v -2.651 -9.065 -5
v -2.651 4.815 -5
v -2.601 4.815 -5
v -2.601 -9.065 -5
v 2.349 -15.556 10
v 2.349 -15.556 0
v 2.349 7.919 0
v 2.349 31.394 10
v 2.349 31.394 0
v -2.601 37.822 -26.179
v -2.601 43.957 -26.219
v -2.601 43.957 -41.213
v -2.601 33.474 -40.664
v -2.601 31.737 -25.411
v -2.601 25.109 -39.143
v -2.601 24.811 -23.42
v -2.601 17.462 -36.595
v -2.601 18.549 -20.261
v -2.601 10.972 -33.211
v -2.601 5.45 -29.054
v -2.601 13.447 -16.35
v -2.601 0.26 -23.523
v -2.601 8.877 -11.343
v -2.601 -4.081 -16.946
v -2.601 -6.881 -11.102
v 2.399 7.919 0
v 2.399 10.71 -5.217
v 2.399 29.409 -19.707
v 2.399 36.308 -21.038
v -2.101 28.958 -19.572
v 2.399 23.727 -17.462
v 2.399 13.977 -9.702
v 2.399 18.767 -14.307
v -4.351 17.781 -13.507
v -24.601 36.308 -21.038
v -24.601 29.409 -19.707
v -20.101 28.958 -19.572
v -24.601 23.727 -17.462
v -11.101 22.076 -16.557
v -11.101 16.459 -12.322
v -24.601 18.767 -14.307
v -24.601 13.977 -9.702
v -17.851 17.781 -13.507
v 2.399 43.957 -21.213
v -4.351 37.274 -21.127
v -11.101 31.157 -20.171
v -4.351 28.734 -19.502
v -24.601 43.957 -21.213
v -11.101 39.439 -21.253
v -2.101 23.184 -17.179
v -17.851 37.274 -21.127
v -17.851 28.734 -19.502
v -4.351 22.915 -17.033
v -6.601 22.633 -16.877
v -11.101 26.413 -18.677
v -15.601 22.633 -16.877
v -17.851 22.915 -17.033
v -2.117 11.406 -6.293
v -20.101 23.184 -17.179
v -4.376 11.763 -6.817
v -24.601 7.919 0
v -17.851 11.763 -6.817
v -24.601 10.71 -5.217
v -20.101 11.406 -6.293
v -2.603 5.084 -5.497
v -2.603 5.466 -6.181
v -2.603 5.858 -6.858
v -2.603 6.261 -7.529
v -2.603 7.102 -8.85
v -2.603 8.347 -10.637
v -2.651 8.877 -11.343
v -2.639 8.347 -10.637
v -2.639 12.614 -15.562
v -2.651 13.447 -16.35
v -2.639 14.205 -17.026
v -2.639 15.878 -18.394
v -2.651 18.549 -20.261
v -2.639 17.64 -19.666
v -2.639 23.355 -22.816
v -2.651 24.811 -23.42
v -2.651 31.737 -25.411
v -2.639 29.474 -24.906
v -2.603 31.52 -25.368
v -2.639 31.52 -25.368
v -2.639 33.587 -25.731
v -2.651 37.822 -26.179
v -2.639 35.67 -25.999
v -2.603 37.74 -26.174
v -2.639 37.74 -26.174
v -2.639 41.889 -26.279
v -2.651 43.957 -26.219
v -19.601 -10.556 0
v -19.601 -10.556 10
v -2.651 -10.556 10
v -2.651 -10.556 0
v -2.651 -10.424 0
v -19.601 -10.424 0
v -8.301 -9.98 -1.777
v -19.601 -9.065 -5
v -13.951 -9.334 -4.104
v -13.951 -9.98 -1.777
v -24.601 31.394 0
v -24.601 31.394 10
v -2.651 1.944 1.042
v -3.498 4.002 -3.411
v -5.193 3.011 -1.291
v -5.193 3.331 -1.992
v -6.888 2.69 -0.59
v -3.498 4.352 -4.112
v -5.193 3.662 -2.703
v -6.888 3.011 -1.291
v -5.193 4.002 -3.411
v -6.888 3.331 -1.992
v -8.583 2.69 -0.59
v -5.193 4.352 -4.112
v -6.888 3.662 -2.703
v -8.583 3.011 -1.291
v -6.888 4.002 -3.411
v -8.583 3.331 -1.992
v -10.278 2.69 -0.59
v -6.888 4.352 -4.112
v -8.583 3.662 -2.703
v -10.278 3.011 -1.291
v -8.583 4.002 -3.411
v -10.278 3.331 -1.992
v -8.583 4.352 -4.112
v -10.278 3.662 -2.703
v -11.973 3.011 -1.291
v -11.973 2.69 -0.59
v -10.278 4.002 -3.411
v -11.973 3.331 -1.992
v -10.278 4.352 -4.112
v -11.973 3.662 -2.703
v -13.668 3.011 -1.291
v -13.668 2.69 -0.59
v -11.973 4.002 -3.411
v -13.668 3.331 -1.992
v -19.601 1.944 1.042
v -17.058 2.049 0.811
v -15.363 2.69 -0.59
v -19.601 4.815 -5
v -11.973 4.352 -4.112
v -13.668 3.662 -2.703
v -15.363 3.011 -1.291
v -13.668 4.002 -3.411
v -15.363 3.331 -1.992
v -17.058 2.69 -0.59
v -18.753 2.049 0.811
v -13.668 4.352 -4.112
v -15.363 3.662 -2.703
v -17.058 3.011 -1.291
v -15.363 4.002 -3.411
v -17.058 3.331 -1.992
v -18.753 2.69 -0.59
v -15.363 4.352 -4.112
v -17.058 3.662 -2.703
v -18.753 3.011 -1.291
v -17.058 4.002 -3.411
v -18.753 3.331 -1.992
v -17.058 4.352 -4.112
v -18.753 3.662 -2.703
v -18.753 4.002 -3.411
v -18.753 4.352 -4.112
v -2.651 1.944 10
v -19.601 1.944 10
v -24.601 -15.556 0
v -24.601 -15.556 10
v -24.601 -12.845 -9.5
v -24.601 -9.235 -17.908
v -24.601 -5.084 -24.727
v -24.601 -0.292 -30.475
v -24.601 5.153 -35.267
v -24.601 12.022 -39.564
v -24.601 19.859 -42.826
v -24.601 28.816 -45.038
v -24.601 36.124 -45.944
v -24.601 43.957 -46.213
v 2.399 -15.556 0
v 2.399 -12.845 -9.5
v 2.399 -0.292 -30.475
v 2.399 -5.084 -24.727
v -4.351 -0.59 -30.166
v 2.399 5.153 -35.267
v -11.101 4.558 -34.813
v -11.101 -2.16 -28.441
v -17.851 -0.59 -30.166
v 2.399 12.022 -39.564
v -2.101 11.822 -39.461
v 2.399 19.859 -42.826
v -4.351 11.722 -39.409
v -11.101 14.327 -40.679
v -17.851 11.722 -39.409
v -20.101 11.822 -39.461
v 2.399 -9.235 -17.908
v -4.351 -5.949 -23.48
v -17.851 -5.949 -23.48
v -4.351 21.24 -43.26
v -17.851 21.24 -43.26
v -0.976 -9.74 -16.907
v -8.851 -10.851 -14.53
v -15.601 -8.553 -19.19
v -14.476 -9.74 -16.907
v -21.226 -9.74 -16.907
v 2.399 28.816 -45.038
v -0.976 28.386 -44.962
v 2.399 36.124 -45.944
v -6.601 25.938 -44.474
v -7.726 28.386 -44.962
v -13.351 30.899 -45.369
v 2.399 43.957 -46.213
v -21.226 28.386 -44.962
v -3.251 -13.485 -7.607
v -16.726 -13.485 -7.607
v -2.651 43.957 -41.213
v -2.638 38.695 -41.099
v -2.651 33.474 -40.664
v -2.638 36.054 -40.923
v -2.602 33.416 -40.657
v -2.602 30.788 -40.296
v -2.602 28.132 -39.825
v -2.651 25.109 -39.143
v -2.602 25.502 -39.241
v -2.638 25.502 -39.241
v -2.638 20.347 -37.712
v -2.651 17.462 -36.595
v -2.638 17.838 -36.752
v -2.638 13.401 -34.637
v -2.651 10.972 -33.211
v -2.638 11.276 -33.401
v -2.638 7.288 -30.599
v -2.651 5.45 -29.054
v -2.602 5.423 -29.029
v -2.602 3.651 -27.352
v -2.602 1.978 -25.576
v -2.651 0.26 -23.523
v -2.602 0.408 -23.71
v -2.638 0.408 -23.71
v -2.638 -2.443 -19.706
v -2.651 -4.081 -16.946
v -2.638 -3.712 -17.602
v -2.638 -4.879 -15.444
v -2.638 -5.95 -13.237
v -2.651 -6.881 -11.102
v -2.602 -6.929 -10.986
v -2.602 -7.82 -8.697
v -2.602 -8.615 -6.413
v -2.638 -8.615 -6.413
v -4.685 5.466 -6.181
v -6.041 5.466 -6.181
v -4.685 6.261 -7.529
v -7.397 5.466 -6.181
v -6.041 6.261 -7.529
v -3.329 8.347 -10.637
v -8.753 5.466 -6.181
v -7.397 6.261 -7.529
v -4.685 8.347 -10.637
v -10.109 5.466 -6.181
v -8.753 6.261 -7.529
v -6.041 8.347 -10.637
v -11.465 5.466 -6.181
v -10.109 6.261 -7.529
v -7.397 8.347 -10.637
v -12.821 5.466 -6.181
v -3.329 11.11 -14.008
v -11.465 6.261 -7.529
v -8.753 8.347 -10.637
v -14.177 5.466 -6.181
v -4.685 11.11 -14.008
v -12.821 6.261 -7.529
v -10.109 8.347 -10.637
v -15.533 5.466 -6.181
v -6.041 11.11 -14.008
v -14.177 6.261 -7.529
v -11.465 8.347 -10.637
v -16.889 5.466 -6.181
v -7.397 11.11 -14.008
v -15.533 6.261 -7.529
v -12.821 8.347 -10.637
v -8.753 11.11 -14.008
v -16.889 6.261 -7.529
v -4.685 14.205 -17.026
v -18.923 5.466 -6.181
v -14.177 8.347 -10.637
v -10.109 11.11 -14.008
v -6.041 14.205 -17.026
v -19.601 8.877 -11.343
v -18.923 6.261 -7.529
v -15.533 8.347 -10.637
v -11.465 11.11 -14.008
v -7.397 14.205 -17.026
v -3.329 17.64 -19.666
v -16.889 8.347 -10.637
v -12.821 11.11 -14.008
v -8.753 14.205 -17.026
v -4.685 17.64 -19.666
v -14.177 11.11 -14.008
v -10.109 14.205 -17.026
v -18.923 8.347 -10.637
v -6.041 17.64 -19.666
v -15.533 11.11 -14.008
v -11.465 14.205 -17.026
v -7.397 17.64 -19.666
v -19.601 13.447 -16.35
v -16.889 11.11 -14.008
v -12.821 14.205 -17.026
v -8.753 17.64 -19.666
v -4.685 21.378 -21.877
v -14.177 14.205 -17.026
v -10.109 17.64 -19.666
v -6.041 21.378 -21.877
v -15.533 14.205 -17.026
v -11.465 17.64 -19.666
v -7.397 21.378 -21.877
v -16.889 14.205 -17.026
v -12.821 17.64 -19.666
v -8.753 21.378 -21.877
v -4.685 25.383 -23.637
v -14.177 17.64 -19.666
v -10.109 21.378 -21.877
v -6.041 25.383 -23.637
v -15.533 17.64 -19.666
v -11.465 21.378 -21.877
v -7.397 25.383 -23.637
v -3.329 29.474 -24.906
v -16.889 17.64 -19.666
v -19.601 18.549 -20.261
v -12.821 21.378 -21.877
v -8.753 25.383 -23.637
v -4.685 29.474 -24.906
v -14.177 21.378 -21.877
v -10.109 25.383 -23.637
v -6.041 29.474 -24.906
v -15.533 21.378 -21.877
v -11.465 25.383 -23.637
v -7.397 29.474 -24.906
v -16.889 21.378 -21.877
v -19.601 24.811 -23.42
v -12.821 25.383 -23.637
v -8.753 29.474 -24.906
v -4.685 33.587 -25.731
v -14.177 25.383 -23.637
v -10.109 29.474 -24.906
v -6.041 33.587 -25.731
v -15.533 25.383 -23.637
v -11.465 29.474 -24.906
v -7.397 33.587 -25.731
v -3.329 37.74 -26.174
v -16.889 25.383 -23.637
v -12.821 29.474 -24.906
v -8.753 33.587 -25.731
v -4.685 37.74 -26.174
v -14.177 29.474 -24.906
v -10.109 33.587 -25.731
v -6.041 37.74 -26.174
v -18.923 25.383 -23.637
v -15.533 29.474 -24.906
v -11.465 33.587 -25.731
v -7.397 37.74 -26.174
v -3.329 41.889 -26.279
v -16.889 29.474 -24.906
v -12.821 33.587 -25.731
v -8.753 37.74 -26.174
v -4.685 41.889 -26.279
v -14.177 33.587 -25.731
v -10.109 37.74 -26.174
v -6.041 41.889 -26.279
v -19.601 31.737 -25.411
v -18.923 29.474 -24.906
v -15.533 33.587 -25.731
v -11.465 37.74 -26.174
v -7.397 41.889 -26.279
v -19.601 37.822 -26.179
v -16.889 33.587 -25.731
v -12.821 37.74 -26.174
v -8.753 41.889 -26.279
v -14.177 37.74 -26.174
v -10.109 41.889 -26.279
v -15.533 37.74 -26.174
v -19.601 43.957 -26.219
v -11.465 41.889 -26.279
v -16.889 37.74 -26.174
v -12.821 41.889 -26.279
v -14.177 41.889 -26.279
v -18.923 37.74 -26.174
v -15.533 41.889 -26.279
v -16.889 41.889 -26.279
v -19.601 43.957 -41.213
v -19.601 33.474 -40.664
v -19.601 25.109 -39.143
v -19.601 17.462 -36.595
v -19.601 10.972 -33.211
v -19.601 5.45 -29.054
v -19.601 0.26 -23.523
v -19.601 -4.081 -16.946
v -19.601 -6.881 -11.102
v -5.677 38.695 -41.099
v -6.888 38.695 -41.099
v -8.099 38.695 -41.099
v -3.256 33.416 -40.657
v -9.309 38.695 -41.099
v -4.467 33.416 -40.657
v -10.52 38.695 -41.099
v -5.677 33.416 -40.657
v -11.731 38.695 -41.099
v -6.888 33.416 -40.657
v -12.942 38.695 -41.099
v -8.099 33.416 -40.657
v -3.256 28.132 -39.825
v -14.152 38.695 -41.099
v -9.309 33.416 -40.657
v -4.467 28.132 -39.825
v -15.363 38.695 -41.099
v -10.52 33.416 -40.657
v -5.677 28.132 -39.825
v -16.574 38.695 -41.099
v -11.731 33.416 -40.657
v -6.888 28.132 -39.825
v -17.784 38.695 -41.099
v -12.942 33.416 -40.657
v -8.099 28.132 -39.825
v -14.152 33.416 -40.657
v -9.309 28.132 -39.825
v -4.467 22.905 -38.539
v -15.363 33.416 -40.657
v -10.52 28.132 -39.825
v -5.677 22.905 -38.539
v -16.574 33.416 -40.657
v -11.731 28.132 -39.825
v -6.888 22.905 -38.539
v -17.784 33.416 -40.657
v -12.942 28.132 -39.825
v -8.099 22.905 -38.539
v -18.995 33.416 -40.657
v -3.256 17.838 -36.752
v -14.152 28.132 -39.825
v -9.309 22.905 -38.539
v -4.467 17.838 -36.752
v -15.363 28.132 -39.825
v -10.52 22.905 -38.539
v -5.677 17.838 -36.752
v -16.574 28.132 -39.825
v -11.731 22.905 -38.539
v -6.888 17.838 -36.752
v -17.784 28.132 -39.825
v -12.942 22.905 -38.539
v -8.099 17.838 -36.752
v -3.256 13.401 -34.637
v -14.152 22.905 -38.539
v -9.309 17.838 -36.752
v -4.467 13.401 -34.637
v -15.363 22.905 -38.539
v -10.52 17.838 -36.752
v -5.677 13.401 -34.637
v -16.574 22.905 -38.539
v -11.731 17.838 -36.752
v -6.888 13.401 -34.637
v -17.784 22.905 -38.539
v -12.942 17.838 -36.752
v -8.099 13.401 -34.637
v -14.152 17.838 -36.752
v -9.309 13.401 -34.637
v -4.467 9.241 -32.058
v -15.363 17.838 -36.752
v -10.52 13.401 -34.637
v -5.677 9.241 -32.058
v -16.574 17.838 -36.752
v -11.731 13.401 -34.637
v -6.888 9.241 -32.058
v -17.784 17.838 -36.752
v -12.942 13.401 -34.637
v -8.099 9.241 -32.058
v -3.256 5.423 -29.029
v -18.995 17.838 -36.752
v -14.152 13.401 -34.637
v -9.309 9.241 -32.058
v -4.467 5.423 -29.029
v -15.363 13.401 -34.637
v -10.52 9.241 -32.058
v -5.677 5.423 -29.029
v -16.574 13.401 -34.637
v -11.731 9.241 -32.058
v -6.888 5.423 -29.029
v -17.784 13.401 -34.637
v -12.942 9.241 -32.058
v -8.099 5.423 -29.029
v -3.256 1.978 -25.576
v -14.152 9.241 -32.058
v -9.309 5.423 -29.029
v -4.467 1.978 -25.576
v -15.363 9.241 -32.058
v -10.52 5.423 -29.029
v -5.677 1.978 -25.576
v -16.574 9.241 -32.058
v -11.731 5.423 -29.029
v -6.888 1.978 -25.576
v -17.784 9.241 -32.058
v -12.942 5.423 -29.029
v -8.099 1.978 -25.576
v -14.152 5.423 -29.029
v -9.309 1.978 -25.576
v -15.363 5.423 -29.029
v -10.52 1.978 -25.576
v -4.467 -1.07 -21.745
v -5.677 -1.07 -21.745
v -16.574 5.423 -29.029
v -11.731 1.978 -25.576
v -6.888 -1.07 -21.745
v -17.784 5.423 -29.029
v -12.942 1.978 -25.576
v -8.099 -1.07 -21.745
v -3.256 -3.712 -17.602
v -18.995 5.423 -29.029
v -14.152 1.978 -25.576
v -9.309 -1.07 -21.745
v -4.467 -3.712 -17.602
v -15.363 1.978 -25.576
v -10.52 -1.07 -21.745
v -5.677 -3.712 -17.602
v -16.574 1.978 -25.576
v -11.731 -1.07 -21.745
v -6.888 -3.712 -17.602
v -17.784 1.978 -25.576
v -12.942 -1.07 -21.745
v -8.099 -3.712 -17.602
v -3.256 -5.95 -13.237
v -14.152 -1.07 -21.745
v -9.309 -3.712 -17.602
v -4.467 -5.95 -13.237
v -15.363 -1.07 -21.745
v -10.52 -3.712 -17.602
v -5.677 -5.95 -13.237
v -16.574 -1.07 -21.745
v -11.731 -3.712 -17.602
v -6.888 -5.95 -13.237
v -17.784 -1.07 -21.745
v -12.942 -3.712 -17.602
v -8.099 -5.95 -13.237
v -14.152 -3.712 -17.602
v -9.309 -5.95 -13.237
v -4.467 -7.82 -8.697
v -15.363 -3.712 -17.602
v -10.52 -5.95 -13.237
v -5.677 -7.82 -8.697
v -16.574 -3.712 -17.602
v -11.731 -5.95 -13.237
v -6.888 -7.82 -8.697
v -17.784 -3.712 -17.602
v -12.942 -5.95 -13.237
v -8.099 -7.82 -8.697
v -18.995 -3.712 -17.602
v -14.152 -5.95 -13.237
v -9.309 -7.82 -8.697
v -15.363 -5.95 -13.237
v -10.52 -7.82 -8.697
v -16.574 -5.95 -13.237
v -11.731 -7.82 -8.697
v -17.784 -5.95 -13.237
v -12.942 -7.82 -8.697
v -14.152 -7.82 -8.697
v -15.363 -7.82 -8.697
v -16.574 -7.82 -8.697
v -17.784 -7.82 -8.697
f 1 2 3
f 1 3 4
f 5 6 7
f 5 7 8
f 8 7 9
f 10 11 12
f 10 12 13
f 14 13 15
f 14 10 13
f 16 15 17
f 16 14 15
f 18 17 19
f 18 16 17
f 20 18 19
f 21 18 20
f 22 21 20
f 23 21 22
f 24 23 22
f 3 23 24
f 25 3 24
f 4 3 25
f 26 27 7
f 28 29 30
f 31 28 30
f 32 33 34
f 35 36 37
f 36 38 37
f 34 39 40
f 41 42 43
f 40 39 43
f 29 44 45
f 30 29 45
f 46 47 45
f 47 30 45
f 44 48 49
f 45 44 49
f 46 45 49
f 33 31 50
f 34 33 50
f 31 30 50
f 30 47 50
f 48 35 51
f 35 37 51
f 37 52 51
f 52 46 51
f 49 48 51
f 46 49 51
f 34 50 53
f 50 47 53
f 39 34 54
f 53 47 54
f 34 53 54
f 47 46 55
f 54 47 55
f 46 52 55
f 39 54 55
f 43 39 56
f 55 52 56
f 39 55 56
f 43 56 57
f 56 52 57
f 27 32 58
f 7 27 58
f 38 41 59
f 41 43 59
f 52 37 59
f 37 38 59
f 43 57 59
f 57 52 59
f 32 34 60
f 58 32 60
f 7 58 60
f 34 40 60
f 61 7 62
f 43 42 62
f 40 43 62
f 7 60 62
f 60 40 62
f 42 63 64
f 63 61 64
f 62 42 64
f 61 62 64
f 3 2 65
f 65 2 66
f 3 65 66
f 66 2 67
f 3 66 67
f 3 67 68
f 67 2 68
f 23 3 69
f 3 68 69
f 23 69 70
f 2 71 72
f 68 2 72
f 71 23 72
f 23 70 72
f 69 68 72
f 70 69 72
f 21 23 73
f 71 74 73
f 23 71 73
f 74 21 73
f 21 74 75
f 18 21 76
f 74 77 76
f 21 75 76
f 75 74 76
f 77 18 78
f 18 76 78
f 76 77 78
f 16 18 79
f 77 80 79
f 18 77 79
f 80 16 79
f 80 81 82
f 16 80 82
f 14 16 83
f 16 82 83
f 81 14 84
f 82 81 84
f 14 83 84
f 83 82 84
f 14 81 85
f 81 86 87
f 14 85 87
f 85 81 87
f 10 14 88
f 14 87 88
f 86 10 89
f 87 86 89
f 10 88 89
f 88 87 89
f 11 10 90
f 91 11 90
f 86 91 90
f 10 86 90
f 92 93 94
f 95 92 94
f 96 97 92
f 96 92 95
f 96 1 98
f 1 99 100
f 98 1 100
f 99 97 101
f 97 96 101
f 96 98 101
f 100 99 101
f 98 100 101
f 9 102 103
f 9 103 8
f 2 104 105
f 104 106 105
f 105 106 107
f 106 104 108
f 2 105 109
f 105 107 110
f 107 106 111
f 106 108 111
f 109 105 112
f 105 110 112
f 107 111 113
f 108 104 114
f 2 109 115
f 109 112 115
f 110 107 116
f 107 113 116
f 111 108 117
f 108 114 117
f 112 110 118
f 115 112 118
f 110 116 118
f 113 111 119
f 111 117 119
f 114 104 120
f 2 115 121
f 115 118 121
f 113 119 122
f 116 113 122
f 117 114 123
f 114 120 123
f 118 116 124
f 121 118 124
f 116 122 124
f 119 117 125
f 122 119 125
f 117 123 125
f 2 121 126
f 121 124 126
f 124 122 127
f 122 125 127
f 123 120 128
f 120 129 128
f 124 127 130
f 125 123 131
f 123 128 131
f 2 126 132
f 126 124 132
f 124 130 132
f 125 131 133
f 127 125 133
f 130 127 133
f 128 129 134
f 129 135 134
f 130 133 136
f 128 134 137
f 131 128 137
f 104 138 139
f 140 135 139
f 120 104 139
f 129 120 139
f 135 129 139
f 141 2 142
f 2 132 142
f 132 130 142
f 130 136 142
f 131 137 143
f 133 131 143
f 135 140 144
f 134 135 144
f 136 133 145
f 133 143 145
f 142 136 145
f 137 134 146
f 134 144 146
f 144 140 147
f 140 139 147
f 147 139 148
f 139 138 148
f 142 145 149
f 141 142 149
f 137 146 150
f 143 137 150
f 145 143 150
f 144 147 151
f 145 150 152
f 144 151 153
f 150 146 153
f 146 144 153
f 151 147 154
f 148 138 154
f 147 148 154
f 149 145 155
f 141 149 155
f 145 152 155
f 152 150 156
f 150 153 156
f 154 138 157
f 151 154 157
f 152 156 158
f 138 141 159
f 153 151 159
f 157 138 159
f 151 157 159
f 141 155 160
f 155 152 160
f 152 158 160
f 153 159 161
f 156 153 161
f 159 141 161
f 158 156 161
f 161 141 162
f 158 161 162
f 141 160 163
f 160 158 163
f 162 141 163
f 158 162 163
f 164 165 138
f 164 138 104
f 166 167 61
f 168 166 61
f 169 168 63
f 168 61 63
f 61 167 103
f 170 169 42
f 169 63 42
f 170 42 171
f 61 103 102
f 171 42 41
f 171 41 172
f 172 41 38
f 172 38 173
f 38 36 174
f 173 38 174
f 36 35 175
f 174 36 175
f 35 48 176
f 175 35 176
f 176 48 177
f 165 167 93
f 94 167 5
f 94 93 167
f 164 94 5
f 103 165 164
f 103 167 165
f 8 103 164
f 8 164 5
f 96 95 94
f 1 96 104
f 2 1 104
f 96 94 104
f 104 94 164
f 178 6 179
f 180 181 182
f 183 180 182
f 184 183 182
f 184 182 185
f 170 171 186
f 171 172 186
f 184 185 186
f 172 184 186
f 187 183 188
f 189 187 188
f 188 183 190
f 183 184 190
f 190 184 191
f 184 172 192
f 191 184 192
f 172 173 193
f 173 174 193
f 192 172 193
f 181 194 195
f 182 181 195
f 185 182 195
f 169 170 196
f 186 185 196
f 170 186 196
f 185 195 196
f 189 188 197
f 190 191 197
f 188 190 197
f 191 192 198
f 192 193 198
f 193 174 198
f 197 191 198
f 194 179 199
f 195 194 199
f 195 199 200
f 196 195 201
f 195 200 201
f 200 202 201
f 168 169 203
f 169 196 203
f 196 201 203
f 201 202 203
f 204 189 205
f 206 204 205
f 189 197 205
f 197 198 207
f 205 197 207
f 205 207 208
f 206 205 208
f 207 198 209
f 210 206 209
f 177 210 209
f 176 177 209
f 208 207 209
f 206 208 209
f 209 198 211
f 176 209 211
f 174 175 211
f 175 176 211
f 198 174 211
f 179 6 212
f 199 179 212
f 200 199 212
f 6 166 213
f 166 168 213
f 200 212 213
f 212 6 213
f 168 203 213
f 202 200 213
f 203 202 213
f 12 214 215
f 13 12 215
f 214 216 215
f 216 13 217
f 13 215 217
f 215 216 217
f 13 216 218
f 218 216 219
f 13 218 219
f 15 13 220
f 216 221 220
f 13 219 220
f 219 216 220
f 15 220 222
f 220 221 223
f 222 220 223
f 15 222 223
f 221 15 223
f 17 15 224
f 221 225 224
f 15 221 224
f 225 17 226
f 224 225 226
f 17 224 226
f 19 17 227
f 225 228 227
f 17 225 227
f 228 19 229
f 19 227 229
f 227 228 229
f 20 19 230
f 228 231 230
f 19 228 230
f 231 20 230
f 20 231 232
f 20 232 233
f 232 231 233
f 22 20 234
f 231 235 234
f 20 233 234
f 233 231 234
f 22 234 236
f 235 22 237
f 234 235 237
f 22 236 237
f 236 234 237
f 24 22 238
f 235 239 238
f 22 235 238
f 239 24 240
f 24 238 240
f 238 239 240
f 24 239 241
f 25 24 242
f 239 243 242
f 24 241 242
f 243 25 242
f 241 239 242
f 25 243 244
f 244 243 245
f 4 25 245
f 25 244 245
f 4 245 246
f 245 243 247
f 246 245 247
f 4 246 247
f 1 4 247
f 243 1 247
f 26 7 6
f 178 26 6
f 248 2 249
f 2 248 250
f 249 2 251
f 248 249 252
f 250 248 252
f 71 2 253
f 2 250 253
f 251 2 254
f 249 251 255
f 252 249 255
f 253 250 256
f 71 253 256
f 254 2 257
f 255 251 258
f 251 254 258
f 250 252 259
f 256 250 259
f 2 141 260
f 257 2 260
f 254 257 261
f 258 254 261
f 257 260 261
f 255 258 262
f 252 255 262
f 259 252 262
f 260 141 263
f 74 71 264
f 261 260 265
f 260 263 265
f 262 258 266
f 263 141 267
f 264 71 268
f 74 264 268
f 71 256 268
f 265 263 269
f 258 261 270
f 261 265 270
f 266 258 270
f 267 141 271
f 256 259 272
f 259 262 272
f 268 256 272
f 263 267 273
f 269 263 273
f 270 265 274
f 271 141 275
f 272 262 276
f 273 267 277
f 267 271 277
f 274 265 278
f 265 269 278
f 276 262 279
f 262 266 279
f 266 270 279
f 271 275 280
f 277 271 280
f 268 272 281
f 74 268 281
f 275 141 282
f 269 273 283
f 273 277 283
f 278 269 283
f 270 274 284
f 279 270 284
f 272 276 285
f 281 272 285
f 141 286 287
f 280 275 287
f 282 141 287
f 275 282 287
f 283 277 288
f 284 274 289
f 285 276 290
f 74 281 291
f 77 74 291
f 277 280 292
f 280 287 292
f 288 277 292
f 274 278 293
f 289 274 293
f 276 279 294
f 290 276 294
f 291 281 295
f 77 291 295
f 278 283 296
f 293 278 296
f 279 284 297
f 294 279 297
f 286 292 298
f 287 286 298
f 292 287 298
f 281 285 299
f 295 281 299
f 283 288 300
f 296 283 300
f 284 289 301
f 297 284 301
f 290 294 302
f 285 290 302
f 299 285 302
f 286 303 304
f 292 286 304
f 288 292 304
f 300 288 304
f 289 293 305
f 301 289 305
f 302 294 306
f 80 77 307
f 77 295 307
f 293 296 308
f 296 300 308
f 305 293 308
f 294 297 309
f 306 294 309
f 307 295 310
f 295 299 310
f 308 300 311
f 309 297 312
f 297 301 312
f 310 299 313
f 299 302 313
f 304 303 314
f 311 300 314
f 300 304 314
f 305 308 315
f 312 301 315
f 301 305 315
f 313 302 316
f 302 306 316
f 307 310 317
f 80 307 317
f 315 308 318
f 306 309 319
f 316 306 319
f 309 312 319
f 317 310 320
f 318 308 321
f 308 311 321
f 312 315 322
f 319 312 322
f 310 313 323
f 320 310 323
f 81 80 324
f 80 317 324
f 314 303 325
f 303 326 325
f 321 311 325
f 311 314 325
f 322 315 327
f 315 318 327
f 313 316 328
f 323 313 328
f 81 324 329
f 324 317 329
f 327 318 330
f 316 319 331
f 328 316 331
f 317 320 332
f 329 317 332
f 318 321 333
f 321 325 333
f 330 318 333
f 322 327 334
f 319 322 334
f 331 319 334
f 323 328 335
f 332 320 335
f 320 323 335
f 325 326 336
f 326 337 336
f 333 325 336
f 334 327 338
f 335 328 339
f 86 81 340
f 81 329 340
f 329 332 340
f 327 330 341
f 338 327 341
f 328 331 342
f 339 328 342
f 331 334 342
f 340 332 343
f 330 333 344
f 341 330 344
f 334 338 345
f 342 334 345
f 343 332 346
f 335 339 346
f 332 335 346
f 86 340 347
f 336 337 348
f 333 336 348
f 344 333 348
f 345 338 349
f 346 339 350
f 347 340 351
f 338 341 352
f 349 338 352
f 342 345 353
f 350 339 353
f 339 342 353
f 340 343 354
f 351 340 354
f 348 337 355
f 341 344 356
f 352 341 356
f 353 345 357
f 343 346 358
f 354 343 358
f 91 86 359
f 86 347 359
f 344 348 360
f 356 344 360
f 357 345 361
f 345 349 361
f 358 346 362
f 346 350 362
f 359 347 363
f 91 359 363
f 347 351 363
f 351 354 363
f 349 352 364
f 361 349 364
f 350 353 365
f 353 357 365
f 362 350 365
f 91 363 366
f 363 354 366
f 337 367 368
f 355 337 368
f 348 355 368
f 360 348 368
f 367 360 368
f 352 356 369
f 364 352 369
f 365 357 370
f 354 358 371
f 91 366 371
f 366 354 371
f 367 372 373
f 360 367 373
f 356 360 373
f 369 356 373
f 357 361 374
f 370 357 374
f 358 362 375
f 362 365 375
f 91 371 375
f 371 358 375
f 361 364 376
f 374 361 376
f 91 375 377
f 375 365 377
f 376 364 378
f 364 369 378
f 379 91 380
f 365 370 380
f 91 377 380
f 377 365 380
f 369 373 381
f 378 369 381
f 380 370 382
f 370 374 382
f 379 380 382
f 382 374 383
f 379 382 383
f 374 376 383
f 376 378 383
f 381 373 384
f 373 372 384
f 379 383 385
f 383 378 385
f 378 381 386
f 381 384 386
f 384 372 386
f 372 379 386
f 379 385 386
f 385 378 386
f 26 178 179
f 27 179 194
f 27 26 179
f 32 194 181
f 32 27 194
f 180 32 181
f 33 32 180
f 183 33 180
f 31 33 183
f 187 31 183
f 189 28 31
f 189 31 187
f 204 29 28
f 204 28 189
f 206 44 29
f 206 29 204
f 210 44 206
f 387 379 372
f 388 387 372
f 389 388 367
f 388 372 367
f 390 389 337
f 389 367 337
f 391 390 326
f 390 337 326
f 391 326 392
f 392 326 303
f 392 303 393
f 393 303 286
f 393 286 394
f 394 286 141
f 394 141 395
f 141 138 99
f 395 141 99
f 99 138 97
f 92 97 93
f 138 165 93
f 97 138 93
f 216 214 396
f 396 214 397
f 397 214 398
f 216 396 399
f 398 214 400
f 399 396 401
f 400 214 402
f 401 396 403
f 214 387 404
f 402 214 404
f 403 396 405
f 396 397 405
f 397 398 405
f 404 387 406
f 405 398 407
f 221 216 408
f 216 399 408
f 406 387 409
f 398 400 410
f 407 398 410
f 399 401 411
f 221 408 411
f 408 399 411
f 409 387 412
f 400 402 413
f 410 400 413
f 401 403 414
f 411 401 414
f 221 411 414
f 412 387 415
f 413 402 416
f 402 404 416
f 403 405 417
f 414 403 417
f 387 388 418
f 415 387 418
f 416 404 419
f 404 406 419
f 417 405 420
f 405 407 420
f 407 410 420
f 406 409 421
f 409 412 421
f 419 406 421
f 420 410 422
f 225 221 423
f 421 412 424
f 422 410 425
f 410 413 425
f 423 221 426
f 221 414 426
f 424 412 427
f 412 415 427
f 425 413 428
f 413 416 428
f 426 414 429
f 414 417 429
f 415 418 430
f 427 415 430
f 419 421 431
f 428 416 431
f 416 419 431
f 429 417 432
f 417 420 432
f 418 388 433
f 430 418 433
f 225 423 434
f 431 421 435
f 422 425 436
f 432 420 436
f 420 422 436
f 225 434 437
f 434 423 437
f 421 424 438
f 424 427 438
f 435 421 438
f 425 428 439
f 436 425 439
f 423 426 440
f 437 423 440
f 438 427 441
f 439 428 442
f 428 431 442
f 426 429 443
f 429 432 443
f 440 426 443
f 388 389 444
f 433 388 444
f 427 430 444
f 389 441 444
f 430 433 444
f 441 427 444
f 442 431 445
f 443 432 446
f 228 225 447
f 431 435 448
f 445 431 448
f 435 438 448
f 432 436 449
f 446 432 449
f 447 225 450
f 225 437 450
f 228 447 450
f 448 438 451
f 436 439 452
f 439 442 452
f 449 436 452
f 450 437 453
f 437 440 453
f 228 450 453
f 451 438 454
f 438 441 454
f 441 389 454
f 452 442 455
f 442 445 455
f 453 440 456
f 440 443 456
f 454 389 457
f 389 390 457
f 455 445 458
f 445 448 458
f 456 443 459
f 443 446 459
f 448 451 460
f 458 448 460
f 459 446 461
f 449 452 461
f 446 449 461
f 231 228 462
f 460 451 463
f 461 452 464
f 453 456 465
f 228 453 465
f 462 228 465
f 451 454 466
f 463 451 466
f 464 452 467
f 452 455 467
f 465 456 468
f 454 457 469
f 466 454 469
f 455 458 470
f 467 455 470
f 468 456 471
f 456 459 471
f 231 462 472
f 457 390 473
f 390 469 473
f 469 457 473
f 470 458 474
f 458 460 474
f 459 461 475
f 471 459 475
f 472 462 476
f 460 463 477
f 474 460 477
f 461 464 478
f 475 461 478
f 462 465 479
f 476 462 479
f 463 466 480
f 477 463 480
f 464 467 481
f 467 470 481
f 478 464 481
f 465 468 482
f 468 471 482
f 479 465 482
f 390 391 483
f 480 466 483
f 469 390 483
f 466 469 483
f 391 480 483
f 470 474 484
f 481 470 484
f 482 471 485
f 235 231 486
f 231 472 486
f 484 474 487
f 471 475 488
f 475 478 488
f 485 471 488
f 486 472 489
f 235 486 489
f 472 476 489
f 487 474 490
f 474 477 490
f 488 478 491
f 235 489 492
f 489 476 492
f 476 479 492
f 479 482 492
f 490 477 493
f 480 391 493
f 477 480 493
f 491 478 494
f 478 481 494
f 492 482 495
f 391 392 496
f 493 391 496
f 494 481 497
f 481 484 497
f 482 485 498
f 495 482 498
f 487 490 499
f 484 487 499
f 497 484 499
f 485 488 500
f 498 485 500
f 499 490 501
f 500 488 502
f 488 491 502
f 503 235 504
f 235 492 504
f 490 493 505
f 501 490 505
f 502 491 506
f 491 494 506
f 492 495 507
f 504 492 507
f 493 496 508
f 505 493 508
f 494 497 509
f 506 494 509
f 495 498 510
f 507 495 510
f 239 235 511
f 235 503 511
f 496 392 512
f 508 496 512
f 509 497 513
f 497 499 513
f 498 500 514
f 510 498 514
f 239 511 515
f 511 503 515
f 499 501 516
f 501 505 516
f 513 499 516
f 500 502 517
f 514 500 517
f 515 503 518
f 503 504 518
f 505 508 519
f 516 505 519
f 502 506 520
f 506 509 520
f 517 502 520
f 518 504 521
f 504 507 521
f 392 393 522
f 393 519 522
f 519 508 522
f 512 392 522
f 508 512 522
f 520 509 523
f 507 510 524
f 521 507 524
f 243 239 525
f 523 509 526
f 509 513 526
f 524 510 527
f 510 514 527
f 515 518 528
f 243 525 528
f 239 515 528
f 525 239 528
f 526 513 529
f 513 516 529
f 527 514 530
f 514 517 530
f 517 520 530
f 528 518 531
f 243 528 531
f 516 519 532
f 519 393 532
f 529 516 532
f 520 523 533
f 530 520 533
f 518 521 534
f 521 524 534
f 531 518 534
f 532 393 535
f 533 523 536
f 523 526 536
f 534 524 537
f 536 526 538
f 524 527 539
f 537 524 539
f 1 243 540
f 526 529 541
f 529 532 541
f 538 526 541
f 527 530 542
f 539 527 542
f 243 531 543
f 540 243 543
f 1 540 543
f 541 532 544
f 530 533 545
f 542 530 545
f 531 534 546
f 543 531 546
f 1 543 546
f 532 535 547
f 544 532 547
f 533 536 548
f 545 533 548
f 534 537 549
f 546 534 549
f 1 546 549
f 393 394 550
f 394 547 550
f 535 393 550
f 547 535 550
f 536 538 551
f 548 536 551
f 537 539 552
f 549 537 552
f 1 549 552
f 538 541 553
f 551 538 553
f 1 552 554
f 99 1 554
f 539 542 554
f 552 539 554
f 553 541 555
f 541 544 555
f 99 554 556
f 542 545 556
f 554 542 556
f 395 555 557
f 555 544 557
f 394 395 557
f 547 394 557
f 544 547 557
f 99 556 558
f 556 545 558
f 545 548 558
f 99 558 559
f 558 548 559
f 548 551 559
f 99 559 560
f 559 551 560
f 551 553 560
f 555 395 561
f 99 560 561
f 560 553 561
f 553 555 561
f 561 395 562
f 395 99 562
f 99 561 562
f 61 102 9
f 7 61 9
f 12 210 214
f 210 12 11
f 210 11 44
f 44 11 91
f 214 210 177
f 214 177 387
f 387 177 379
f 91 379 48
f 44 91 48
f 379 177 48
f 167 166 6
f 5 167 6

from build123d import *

# Parameters (mm, degrees)
SKETCH1_W           = 26.95
SKETCH1_H           = 46.95
BOSS_EXTRUDE1_DEPTH = 10
BOSS_EXTRUDE2_DEPTH = 27
SHELL8_START        = -19.600513699
SHELL8_DEPTH        = 16.95
SHELL8_START_2      = -2.650513699
SHELL8_2_DEPTH      = 0.05
SKETCH2_W           = 16.95
SKETCH2_H           = 12.5
CUT_EXTRUDE4_DEPTH  = 10


with BuildPart() as part:
    # Sketch1 → Boss-Extrude1 (new body)
    with BuildSketch(Plane.XY):
        with Locations((-11.125513699, 7.918792808)):
            Rectangle(SKETCH1_W, SKETCH1_H)
    extrude(amount=BOSS_EXTRUDE1_DEPTH)

    # Sketch4 → Boss-Extrude2 (add)
    with BuildSketch(Plane.ZY.offset(24.600513699)):
        with BuildLine():
            Line((-46.212773115, 43.956542828), (-21.212773115, 43.956542828))
            add(Edge.make_bspline(
                [(-21.212773115, 43.956542828), (-22.507146557, 18.214325733), (0, 7.918792808)],
                knots=[0, 0, 0, 1, 1, 1], degree=2))
            Line((0, 7.918792808), (0, -15.556207192))
            add(Edge.make_bspline(
                [(0, -15.556207192), (-46.51884588, -5.084322465), (-46.212773115, 43.956542828)],
                knots=[0, 0, 0, 1, 1, 1], degree=2))
        make_face()
    extrude(amount=-BOSS_EXTRUDE2_DEPTH)

    # Shell8: read off the stored shape, not the designer's step
    # Shell8 outline → Shell8 (cut)
    with BuildSketch(Plane.YZ.offset(SHELL8_START)):
        with BuildLine():
            add(Edge.make_bspline(
                [(0.133337383, 5), (0.345681756, 4.535792266), (0.558026134, 4.071584534), (0.983328432, 3.141827798), (1.196286353, 2.676278794), (1.515939617, 1.977482236), (1.622634963, 1.744234684), (1.836025783, 1.277739332), (1.942721258, 1.044491531), (2.156238437, 0.577719852), (2.263060141, 0.344195974), (2.476703299, -0.122850765), (2.583524752, -0.356373626), (2.743774073, -0.7066967), (2.797202188, -0.823496798), (2.90405926, -1.057096448), (2.957488218, -1.173896), (3.064343405, -1.40749826), (3.117769635, -1.524300968), (3.224635192, -1.757900928), (3.278074521, -1.874698178), (3.358690558, -2.050988982), (3.385885066, -2.110474317), (3.440500257, -2.229341011), (3.467920939, -2.28872237), (3.522966477, -2.4073897), (3.550591329, -2.466675672), (3.606052478, -2.585148793), (3.633888775, -2.644335942), (3.717712007, -2.821743977), (3.774015221, -2.939815627), (3.887473761, -3.175549982), (3.944629094, -3.293212682), (4.059722281, -3.527962081), (4.117659001, -3.645049336), (4.234395499, -3.878791899), (4.293195274, -3.995447208), (4.470904183, -4.344756863), (4.591119744, -4.576748487), (4.746963204, -4.871943256), (4.780959441, -4.936008122), (4.815092457, -5)],
                knots=[0, 0, 0, 0, 1.531408038, 1.531408038, 3.067240894, 3.067240894, 3.836717895, 3.836717895, 4.606195736, 4.606195736, 5.376584277, 5.376584277, 6.146969731, 6.146969731, 6.532289645, 6.532289645, 6.91760913, 6.91760913, 7.302933783, 7.302933783, 7.688260043, 7.688260043, 7.884480209, 7.884480209, 8.080699876, 8.080699876, 8.276917809, 8.276917809, 8.473136224, 8.473136224, 8.865559231, 8.865559231, 9.257985754, 9.257985754, 9.649893747, 9.649893747, 10.041800114, 10.041800114, 10.825634375, 10.825634375, 11.043210189, 11.043210189, 11.043210189, 11.043210189], degree=3))
            Line((0.133337383, 5), (-10.556207192, 5))
            Line((-10.556207192, 5), (-10.556207192, 0.563474302))
            add(Edge.make_bspline(
                [(-9.064978411, -4.999999991), (-9.156570125, -4.701885385), (-9.24631398, -4.403203161), (-9.561269931, -3.331553183), (-9.77625048, -2.555588985), (-10.183066223, -0.9993865), (-10.374950059, -0.219160945), (-10.556207192, 0.563474302)],
                knots=[69.771004898, 69.771004898, 69.771004898, 69.771004898, 70.706566593, 70.706566593, 73.121797433, 73.121797433, 75.531849504, 75.531849504, 75.531849504, 75.531849504], degree=3))
            Line((-9.064978411, -4.999999991), (4.815092457, -5))
        make_face()
        with BuildLine():
            add(Edge.make_bspline(
                [(4.815092457, -5), (4.903802589, -5.16631194), (4.993436598, -5.332130884), (5.209418135, -5.726348117), (5.336622424, -5.95427718), (5.594591961, -6.407949193), (5.725355246, -6.633693259), (5.990554029, -7.083012804), (6.124989536, -7.306588277), (6.533877125, -7.973910646), (6.813909864, -8.414252757), (7.501769623, -9.45538102), (7.916708251, -10.051491595), (8.776915799, -11.222231728), (9.222210647, -11.796842257), (10.14315243, -12.921459213), (10.618805958, -13.471460251), (11.596271939, -14.539674082), (12.097844547, -15.05810607), (13.129821164, -16.06512428), (13.660215755, -16.553720139), (14.748839143, -17.498721573), (15.307064076, -17.955131594), (16.452632219, -18.835753352), (17.040102002, -19.259800533), (18.239831396, -20.071505643), (18.852095715, -20.459156614), (20.099010065, -21.196614321), (20.733660392, -21.546420557), (22.027410025, -22.209707809), (22.686652036, -22.522910303), (24.02247808, -23.109745158), (24.699061762, -23.383378322), (26.06673068, -23.891282927), (26.757814216, -24.125558955), (28.122867732, -24.546564943), (28.796354803, -24.734866604), (30.152177572, -25.077042106), (30.834515492, -25.23090712), (32.20623315, -25.505495974), (32.89561695, -25.626199435), (34.27960354, -25.835879011), (34.974209302, -25.9248354), (36.359066573, -26.071729163), (37.049283903, -26.129991675), (38.431219698, -26.218560515), (39.122937475, -26.248877708), (40.50608531, -26.283225615), (41.197514548, -26.287290879), (42.578339573, -26.270865345), (43.267736076, -26.250436697), (43.956542828, -26.218584564)],
                knots=[11.043210189, 11.043210189, 11.043210189, 11.043210189, 11.608679687, 11.608679687, 12.39171379, 12.39171379, 13.17432443, 13.17432443, 13.956936752, 13.956936752, 15.522163921, 15.522163921, 17.700153688, 17.700153688, 19.880027691, 19.880027691, 22.060376756, 22.060376756, 24.223274542, 24.223274542, 26.385469858, 26.385469858, 28.547365884, 28.547365884, 30.719608792, 30.719608792, 32.892266153, 32.892266153, 35.06495227, 35.06495227, 37.253221206, 37.253221206, 39.4414458, 39.4414458, 41.629415114, 41.629415114, 43.726426105, 43.726426105, 45.823973995, 45.823973995, 47.922808087, 47.922808087, 50.022944109, 50.022944109, 52.100361974, 52.100361974, 54.176971764, 54.176971764, 56.250847899, 56.250847899, 58.319472882, 58.319472882, 58.319472882, 58.319472882], degree=3))
            Line((4.815092457, -5), (-9.064978411, -4.999999991))
            add(Edge.make_bspline(
                [(43.956542828, -41.212675735), (43.08159333, -41.218387139), (42.206510767, -41.212470025), (40.452472812, -41.175466896), (39.573520137, -41.144254146), (37.81409322, -41.05450592), (36.933623442, -40.995881178), (35.173557367, -40.849113982), (34.293965366, -40.760919539), (32.538042346, -40.552823313), (31.661713288, -40.432904863), (29.899770644, -40.156829312), (29.014245887, -40.000101308), (27.251562235, -39.649281799), (26.374395484, -39.455229981), (24.630942511, -39.02748594), (23.764643629, -38.793845568), (22.045439839, -38.284683982), (21.192521132, -38.009209545), (19.502563594, -37.414184785), (18.66551781, -37.094654292), (17.080744635, -36.438781556), (16.331472067, -36.106175889), (14.851543336, -35.401485138), (14.120890004, -35.029394096), (12.681301321, -34.245280752), (11.972365934, -33.833258519), (10.585013137, -32.972971721), (9.906390037, -32.525039184), (8.576171468, -31.59065667), (7.924576288, -31.104206282), (6.6509416, -30.094123435), (6.028900056, -29.570493545), (4.816011624, -28.4875535), (4.22518422, -27.92822153), (3.076653554, -26.77647648), (2.518952412, -26.184061288), (1.437715478, -24.968886679), (0.914179031, -24.346127843), (-0.102171007, -23.068298687), (-0.59472033, -22.413018454), (-1.544810043, -21.077595755), (-2.002350454, -20.397453304), (-2.882958603, -19.015301999), (-3.306028267, -18.313294369), (-4.117827977, -16.891618757), (-4.506625676, -16.171989322), (-5.252096056, -14.716148432), (-5.608762794, -13.979933942), (-6.291436173, -12.493001824), (-6.617427028, -11.742276968), (-7.240180735, -10.228384956), (-7.536928694, -9.46521169), (-8.098270292, -7.940224914), (-8.363281633, -7.178564727), (-8.770075995, -5.943328274), (-8.919846996, -5.472376719), (-9.064978411, -4.999999991)],
                knots=[0, 0, 0, 0, 2.624912237, 2.624912237, 5.263057644, 5.263057644, 7.909854609, 7.909854609, 10.561329771, 10.561329771, 13.214200731, 13.214200731, 15.911305703, 15.911305703, 18.605558456, 18.605558456, 21.296309343, 21.296309343, 23.984073444, 23.984073444, 26.670631688, 26.670631688, 29.128871448, 29.128871448, 31.587482756, 31.587482756, 34.04608988, 34.04608988, 36.484129019, 36.484129019, 38.922194168, 38.922194168, 41.360090952, 41.360090952, 43.799491796, 43.799491796, 46.239048551, 46.239048551, 48.678558649, 48.678558649, 51.136642725, 51.136642725, 53.594725264, 53.594725264, 56.05267039, 56.05267039, 58.505649358, 58.505649358, 60.95908098, 60.95908098, 63.413768252, 63.413768252, 65.869699113, 65.869699113, 68.288563026, 68.288563026, 69.771004898, 69.771004898, 69.771004898, 69.771004898], degree=3))
            Line((43.956542828, -41.212675735), (43.956542828, -26.218584564))
        make_face()
    extrude(amount=SHELL8_DEPTH, mode=Mode.SUBTRACT)

    # Shell8 2 outline → Shell8 2 (cut)
    with BuildSketch(Plane.YZ.offset(SHELL8_START_2)):
        with BuildLine():
            add(Edge.make_bspline(
                [(4.815092457, -5), (4.903802589, -5.16631194), (4.993436598, -5.332130884), (5.209418135, -5.726348117), (5.336622424, -5.95427718), (5.594591961, -6.407949193), (5.725355246, -6.633693259), (5.990554029, -7.083012804), (6.124989536, -7.306588277), (6.533877125, -7.973910646), (6.813909864, -8.414252757), (7.501769623, -9.45538102), (7.916708251, -10.051491595), (8.776915799, -11.222231728), (9.222210647, -11.796842257), (10.14315243, -12.921459213), (10.618805958, -13.471460251), (11.596271939, -14.539674082), (12.097844547, -15.05810607), (13.129821164, -16.06512428), (13.660215755, -16.553720139), (14.748839143, -17.498721573), (15.307064076, -17.955131594), (16.452632219, -18.835753352), (17.040102002, -19.259800533), (18.239831396, -20.071505643), (18.852095715, -20.459156614), (20.099010065, -21.196614321), (20.733660392, -21.546420557), (22.027410025, -22.209707809), (22.686652036, -22.522910303), (24.02247808, -23.109745158), (24.699061762, -23.383378322), (26.06673068, -23.891282927), (26.757814216, -24.125558955), (28.122867732, -24.546564943), (28.796354803, -24.734866604), (30.152177572, -25.077042106), (30.834515492, -25.23090712), (32.20623315, -25.505495974), (32.89561695, -25.626199435), (34.27960354, -25.835879011), (34.974209302, -25.9248354), (36.359066573, -26.071729163), (37.049283903, -26.129991675), (38.431219698, -26.218560515), (39.122937475, -26.248877708), (40.50608531, -26.283225615), (41.197514548, -26.287290879), (42.578339573, -26.270865345), (43.267736076, -26.250436697), (43.956542828, -26.218584564)],
                knots=[11.043210189, 11.043210189, 11.043210189, 11.043210189, 11.608679687, 11.608679687, 12.39171379, 12.39171379, 13.17432443, 13.17432443, 13.956936752, 13.956936752, 15.522163921, 15.522163921, 17.700153688, 17.700153688, 19.880027691, 19.880027691, 22.060376756, 22.060376756, 24.223274542, 24.223274542, 26.385469858, 26.385469858, 28.547365884, 28.547365884, 30.719608792, 30.719608792, 32.892266153, 32.892266153, 35.06495227, 35.06495227, 37.253221206, 37.253221206, 39.4414458, 39.4414458, 41.629415114, 41.629415114, 43.726426105, 43.726426105, 45.823973995, 45.823973995, 47.922808087, 47.922808087, 50.022944109, 50.022944109, 52.100361974, 52.100361974, 54.176971764, 54.176971764, 56.250847899, 56.250847899, 58.319472882, 58.319472882, 58.319472882, 58.319472882], degree=3))
            Line((4.815092457, -5), (-9.064978411, -4.999999991))
            add(Edge.make_bspline(
                [(43.956542828, -41.212675735), (43.08159333, -41.218387139), (42.206510767, -41.212470025), (40.452472812, -41.175466896), (39.573520137, -41.144254146), (37.81409322, -41.05450592), (36.933623442, -40.995881178), (35.173557367, -40.849113982), (34.293965366, -40.760919539), (32.538042346, -40.552823313), (31.661713288, -40.432904863), (29.899770644, -40.156829312), (29.014245887, -40.000101308), (27.251562235, -39.649281799), (26.374395484, -39.455229981), (24.630942511, -39.02748594), (23.764643629, -38.793845568), (22.045439839, -38.284683982), (21.192521132, -38.009209545), (19.502563594, -37.414184785), (18.66551781, -37.094654292), (17.080744635, -36.438781556), (16.331472067, -36.106175889), (14.851543336, -35.401485138), (14.120890004, -35.029394096), (12.681301321, -34.245280752), (11.972365934, -33.833258519), (10.585013137, -32.972971721), (9.906390037, -32.525039184), (8.576171468, -31.59065667), (7.924576288, -31.104206282), (6.6509416, -30.094123435), (6.028900056, -29.570493545), (4.816011624, -28.4875535), (4.22518422, -27.92822153), (3.076653554, -26.77647648), (2.518952412, -26.184061288), (1.437715478, -24.968886679), (0.914179031, -24.346127843), (-0.102171007, -23.068298687), (-0.59472033, -22.413018454), (-1.544810043, -21.077595755), (-2.002350454, -20.397453304), (-2.882958603, -19.015301999), (-3.306028267, -18.313294369), (-4.117827977, -16.891618757), (-4.506625676, -16.171989322), (-5.252096056, -14.716148432), (-5.608762794, -13.979933942), (-6.291436173, -12.493001824), (-6.617427028, -11.742276968), (-7.240180735, -10.228384956), (-7.536928694, -9.46521169), (-8.098270292, -7.940224914), (-8.363281633, -7.178564727), (-8.770075995, -5.943328274), (-8.919846996, -5.472376719), (-9.064978411, -4.999999991)],
                knots=[0, 0, 0, 0, 2.624912237, 2.624912237, 5.263057644, 5.263057644, 7.909854609, 7.909854609, 10.561329771, 10.561329771, 13.214200731, 13.214200731, 15.911305703, 15.911305703, 18.605558456, 18.605558456, 21.296309343, 21.296309343, 23.984073444, 23.984073444, 26.670631688, 26.670631688, 29.128871448, 29.128871448, 31.587482756, 31.587482756, 34.04608988, 34.04608988, 36.484129019, 36.484129019, 38.922194168, 38.922194168, 41.360090952, 41.360090952, 43.799491796, 43.799491796, 46.239048551, 46.239048551, 48.678558649, 48.678558649, 51.136642725, 51.136642725, 53.594725264, 53.594725264, 56.05267039, 56.05267039, 58.505649358, 58.505649358, 60.95908098, 60.95908098, 63.413768252, 63.413768252, 65.869699113, 65.869699113, 68.288563026, 68.288563026, 69.771004898, 69.771004898, 69.771004898, 69.771004898], degree=3))
            Line((43.956542828, -41.212675735), (43.956542828, -26.218584564))
        make_face()
    extrude(amount=SHELL8_2_DEPTH, mode=Mode.SUBTRACT)

    # Sketch2 → Cut-Extrude4 (cut)
    with BuildSketch(Plane.XY.offset(10)):
        with Locations((-11.125513699, -4.306207192)):
            Rectangle(SKETCH2_W, SKETCH2_H)
    extrude(amount=-CUT_EXTRUDE4_DEPTH, mode=Mode.SUBTRACT)


solid = part.part
